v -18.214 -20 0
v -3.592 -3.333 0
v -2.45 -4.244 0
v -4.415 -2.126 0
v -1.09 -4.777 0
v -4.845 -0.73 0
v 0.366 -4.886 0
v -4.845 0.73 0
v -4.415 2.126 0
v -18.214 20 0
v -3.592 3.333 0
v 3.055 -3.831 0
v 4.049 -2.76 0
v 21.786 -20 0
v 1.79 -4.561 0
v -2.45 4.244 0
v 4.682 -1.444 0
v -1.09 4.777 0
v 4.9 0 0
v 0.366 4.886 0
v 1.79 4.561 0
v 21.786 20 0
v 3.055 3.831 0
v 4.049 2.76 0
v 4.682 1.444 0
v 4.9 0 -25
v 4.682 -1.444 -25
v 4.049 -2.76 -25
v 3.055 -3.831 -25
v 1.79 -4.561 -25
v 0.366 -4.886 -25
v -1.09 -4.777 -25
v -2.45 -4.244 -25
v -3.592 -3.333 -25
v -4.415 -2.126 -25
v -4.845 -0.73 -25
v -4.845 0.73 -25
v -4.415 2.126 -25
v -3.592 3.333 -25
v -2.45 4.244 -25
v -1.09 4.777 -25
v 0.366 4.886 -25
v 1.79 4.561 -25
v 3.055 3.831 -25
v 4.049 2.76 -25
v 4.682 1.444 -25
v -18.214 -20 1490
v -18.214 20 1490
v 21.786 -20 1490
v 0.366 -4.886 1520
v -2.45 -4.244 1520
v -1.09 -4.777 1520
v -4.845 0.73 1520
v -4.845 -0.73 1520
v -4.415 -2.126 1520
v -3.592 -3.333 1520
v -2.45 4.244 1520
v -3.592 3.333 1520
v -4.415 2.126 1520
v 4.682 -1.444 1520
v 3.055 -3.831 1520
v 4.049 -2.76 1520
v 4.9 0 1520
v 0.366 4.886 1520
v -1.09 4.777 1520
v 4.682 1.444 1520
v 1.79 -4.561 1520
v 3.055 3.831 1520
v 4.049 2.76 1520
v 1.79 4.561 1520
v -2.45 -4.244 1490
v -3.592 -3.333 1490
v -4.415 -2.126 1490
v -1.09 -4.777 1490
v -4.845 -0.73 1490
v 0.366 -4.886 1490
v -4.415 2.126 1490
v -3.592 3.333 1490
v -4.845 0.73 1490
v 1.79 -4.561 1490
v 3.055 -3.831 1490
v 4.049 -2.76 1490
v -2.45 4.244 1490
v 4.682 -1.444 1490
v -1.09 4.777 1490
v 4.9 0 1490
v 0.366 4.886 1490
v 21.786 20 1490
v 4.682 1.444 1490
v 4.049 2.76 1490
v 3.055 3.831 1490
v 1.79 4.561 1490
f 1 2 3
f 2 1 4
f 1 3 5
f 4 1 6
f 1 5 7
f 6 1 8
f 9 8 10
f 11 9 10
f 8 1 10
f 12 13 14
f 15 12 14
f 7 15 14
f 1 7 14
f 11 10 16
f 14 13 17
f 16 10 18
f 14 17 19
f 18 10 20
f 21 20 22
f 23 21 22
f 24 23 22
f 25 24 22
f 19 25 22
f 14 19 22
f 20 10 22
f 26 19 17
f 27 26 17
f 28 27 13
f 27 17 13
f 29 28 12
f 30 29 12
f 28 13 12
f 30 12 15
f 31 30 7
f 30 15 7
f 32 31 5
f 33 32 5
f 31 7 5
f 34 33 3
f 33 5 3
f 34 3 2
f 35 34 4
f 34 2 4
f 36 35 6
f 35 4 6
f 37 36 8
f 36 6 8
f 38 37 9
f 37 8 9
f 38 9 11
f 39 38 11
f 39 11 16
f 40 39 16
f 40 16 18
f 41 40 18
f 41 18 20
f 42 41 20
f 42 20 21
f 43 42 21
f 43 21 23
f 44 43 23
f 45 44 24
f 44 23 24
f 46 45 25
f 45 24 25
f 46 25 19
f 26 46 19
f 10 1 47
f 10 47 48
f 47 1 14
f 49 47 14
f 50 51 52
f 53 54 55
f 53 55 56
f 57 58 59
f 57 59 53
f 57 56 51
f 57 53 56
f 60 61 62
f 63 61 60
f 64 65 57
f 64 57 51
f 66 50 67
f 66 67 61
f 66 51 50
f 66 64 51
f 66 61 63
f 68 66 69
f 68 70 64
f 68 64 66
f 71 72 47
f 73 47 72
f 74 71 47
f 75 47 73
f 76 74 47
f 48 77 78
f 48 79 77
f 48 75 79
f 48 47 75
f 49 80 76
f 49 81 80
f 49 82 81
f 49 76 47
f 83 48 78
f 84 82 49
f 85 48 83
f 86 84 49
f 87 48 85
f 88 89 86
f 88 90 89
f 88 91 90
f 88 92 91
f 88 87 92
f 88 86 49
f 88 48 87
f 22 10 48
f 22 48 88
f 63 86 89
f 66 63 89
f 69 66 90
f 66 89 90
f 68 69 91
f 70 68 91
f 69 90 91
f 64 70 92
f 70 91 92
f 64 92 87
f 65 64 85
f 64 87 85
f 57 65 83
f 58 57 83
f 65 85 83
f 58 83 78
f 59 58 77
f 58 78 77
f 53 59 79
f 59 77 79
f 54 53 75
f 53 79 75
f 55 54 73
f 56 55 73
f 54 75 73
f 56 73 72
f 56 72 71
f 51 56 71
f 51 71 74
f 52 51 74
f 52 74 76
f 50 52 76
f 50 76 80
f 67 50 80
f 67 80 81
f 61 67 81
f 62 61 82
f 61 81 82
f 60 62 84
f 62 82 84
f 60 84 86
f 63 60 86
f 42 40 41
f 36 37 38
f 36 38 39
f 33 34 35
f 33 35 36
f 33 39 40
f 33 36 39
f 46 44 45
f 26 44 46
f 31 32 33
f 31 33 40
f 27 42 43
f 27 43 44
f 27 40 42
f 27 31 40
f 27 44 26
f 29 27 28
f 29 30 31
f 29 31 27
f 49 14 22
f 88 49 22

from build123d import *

# Parameters (mm, degrees)
F0_W     = 40
F0_H     = 40
F1_DEPTH = 1490
F2_R     = 4.9
F3_DEPTH = 30
F4_R     = 4.9
F5_DEPTH = 25


with BuildPart() as f1:
    # F0 (on Top) → F1 (new body)
    with BuildSketch(Plane.XY):
        with Locations((1.785715, 0)):
            Rectangle(F0_W, F0_H)
    extrude(amount=F1_DEPTH)

    # F2 (on face) → F3 (join)
    with BuildSketch(Plane.XY.offset(1490)):
        Circle(F2_R)
    extrude(amount=F3_DEPTH)

    # F4 (on face) → F5 (join)
    with BuildSketch(Plane(origin=(0, 0, 0), x_dir=(1, 0, 0), z_dir=(0, 0, -1))):
        Circle(F4_R)
    extrude(amount=F5_DEPTH)


solid = f1.part
